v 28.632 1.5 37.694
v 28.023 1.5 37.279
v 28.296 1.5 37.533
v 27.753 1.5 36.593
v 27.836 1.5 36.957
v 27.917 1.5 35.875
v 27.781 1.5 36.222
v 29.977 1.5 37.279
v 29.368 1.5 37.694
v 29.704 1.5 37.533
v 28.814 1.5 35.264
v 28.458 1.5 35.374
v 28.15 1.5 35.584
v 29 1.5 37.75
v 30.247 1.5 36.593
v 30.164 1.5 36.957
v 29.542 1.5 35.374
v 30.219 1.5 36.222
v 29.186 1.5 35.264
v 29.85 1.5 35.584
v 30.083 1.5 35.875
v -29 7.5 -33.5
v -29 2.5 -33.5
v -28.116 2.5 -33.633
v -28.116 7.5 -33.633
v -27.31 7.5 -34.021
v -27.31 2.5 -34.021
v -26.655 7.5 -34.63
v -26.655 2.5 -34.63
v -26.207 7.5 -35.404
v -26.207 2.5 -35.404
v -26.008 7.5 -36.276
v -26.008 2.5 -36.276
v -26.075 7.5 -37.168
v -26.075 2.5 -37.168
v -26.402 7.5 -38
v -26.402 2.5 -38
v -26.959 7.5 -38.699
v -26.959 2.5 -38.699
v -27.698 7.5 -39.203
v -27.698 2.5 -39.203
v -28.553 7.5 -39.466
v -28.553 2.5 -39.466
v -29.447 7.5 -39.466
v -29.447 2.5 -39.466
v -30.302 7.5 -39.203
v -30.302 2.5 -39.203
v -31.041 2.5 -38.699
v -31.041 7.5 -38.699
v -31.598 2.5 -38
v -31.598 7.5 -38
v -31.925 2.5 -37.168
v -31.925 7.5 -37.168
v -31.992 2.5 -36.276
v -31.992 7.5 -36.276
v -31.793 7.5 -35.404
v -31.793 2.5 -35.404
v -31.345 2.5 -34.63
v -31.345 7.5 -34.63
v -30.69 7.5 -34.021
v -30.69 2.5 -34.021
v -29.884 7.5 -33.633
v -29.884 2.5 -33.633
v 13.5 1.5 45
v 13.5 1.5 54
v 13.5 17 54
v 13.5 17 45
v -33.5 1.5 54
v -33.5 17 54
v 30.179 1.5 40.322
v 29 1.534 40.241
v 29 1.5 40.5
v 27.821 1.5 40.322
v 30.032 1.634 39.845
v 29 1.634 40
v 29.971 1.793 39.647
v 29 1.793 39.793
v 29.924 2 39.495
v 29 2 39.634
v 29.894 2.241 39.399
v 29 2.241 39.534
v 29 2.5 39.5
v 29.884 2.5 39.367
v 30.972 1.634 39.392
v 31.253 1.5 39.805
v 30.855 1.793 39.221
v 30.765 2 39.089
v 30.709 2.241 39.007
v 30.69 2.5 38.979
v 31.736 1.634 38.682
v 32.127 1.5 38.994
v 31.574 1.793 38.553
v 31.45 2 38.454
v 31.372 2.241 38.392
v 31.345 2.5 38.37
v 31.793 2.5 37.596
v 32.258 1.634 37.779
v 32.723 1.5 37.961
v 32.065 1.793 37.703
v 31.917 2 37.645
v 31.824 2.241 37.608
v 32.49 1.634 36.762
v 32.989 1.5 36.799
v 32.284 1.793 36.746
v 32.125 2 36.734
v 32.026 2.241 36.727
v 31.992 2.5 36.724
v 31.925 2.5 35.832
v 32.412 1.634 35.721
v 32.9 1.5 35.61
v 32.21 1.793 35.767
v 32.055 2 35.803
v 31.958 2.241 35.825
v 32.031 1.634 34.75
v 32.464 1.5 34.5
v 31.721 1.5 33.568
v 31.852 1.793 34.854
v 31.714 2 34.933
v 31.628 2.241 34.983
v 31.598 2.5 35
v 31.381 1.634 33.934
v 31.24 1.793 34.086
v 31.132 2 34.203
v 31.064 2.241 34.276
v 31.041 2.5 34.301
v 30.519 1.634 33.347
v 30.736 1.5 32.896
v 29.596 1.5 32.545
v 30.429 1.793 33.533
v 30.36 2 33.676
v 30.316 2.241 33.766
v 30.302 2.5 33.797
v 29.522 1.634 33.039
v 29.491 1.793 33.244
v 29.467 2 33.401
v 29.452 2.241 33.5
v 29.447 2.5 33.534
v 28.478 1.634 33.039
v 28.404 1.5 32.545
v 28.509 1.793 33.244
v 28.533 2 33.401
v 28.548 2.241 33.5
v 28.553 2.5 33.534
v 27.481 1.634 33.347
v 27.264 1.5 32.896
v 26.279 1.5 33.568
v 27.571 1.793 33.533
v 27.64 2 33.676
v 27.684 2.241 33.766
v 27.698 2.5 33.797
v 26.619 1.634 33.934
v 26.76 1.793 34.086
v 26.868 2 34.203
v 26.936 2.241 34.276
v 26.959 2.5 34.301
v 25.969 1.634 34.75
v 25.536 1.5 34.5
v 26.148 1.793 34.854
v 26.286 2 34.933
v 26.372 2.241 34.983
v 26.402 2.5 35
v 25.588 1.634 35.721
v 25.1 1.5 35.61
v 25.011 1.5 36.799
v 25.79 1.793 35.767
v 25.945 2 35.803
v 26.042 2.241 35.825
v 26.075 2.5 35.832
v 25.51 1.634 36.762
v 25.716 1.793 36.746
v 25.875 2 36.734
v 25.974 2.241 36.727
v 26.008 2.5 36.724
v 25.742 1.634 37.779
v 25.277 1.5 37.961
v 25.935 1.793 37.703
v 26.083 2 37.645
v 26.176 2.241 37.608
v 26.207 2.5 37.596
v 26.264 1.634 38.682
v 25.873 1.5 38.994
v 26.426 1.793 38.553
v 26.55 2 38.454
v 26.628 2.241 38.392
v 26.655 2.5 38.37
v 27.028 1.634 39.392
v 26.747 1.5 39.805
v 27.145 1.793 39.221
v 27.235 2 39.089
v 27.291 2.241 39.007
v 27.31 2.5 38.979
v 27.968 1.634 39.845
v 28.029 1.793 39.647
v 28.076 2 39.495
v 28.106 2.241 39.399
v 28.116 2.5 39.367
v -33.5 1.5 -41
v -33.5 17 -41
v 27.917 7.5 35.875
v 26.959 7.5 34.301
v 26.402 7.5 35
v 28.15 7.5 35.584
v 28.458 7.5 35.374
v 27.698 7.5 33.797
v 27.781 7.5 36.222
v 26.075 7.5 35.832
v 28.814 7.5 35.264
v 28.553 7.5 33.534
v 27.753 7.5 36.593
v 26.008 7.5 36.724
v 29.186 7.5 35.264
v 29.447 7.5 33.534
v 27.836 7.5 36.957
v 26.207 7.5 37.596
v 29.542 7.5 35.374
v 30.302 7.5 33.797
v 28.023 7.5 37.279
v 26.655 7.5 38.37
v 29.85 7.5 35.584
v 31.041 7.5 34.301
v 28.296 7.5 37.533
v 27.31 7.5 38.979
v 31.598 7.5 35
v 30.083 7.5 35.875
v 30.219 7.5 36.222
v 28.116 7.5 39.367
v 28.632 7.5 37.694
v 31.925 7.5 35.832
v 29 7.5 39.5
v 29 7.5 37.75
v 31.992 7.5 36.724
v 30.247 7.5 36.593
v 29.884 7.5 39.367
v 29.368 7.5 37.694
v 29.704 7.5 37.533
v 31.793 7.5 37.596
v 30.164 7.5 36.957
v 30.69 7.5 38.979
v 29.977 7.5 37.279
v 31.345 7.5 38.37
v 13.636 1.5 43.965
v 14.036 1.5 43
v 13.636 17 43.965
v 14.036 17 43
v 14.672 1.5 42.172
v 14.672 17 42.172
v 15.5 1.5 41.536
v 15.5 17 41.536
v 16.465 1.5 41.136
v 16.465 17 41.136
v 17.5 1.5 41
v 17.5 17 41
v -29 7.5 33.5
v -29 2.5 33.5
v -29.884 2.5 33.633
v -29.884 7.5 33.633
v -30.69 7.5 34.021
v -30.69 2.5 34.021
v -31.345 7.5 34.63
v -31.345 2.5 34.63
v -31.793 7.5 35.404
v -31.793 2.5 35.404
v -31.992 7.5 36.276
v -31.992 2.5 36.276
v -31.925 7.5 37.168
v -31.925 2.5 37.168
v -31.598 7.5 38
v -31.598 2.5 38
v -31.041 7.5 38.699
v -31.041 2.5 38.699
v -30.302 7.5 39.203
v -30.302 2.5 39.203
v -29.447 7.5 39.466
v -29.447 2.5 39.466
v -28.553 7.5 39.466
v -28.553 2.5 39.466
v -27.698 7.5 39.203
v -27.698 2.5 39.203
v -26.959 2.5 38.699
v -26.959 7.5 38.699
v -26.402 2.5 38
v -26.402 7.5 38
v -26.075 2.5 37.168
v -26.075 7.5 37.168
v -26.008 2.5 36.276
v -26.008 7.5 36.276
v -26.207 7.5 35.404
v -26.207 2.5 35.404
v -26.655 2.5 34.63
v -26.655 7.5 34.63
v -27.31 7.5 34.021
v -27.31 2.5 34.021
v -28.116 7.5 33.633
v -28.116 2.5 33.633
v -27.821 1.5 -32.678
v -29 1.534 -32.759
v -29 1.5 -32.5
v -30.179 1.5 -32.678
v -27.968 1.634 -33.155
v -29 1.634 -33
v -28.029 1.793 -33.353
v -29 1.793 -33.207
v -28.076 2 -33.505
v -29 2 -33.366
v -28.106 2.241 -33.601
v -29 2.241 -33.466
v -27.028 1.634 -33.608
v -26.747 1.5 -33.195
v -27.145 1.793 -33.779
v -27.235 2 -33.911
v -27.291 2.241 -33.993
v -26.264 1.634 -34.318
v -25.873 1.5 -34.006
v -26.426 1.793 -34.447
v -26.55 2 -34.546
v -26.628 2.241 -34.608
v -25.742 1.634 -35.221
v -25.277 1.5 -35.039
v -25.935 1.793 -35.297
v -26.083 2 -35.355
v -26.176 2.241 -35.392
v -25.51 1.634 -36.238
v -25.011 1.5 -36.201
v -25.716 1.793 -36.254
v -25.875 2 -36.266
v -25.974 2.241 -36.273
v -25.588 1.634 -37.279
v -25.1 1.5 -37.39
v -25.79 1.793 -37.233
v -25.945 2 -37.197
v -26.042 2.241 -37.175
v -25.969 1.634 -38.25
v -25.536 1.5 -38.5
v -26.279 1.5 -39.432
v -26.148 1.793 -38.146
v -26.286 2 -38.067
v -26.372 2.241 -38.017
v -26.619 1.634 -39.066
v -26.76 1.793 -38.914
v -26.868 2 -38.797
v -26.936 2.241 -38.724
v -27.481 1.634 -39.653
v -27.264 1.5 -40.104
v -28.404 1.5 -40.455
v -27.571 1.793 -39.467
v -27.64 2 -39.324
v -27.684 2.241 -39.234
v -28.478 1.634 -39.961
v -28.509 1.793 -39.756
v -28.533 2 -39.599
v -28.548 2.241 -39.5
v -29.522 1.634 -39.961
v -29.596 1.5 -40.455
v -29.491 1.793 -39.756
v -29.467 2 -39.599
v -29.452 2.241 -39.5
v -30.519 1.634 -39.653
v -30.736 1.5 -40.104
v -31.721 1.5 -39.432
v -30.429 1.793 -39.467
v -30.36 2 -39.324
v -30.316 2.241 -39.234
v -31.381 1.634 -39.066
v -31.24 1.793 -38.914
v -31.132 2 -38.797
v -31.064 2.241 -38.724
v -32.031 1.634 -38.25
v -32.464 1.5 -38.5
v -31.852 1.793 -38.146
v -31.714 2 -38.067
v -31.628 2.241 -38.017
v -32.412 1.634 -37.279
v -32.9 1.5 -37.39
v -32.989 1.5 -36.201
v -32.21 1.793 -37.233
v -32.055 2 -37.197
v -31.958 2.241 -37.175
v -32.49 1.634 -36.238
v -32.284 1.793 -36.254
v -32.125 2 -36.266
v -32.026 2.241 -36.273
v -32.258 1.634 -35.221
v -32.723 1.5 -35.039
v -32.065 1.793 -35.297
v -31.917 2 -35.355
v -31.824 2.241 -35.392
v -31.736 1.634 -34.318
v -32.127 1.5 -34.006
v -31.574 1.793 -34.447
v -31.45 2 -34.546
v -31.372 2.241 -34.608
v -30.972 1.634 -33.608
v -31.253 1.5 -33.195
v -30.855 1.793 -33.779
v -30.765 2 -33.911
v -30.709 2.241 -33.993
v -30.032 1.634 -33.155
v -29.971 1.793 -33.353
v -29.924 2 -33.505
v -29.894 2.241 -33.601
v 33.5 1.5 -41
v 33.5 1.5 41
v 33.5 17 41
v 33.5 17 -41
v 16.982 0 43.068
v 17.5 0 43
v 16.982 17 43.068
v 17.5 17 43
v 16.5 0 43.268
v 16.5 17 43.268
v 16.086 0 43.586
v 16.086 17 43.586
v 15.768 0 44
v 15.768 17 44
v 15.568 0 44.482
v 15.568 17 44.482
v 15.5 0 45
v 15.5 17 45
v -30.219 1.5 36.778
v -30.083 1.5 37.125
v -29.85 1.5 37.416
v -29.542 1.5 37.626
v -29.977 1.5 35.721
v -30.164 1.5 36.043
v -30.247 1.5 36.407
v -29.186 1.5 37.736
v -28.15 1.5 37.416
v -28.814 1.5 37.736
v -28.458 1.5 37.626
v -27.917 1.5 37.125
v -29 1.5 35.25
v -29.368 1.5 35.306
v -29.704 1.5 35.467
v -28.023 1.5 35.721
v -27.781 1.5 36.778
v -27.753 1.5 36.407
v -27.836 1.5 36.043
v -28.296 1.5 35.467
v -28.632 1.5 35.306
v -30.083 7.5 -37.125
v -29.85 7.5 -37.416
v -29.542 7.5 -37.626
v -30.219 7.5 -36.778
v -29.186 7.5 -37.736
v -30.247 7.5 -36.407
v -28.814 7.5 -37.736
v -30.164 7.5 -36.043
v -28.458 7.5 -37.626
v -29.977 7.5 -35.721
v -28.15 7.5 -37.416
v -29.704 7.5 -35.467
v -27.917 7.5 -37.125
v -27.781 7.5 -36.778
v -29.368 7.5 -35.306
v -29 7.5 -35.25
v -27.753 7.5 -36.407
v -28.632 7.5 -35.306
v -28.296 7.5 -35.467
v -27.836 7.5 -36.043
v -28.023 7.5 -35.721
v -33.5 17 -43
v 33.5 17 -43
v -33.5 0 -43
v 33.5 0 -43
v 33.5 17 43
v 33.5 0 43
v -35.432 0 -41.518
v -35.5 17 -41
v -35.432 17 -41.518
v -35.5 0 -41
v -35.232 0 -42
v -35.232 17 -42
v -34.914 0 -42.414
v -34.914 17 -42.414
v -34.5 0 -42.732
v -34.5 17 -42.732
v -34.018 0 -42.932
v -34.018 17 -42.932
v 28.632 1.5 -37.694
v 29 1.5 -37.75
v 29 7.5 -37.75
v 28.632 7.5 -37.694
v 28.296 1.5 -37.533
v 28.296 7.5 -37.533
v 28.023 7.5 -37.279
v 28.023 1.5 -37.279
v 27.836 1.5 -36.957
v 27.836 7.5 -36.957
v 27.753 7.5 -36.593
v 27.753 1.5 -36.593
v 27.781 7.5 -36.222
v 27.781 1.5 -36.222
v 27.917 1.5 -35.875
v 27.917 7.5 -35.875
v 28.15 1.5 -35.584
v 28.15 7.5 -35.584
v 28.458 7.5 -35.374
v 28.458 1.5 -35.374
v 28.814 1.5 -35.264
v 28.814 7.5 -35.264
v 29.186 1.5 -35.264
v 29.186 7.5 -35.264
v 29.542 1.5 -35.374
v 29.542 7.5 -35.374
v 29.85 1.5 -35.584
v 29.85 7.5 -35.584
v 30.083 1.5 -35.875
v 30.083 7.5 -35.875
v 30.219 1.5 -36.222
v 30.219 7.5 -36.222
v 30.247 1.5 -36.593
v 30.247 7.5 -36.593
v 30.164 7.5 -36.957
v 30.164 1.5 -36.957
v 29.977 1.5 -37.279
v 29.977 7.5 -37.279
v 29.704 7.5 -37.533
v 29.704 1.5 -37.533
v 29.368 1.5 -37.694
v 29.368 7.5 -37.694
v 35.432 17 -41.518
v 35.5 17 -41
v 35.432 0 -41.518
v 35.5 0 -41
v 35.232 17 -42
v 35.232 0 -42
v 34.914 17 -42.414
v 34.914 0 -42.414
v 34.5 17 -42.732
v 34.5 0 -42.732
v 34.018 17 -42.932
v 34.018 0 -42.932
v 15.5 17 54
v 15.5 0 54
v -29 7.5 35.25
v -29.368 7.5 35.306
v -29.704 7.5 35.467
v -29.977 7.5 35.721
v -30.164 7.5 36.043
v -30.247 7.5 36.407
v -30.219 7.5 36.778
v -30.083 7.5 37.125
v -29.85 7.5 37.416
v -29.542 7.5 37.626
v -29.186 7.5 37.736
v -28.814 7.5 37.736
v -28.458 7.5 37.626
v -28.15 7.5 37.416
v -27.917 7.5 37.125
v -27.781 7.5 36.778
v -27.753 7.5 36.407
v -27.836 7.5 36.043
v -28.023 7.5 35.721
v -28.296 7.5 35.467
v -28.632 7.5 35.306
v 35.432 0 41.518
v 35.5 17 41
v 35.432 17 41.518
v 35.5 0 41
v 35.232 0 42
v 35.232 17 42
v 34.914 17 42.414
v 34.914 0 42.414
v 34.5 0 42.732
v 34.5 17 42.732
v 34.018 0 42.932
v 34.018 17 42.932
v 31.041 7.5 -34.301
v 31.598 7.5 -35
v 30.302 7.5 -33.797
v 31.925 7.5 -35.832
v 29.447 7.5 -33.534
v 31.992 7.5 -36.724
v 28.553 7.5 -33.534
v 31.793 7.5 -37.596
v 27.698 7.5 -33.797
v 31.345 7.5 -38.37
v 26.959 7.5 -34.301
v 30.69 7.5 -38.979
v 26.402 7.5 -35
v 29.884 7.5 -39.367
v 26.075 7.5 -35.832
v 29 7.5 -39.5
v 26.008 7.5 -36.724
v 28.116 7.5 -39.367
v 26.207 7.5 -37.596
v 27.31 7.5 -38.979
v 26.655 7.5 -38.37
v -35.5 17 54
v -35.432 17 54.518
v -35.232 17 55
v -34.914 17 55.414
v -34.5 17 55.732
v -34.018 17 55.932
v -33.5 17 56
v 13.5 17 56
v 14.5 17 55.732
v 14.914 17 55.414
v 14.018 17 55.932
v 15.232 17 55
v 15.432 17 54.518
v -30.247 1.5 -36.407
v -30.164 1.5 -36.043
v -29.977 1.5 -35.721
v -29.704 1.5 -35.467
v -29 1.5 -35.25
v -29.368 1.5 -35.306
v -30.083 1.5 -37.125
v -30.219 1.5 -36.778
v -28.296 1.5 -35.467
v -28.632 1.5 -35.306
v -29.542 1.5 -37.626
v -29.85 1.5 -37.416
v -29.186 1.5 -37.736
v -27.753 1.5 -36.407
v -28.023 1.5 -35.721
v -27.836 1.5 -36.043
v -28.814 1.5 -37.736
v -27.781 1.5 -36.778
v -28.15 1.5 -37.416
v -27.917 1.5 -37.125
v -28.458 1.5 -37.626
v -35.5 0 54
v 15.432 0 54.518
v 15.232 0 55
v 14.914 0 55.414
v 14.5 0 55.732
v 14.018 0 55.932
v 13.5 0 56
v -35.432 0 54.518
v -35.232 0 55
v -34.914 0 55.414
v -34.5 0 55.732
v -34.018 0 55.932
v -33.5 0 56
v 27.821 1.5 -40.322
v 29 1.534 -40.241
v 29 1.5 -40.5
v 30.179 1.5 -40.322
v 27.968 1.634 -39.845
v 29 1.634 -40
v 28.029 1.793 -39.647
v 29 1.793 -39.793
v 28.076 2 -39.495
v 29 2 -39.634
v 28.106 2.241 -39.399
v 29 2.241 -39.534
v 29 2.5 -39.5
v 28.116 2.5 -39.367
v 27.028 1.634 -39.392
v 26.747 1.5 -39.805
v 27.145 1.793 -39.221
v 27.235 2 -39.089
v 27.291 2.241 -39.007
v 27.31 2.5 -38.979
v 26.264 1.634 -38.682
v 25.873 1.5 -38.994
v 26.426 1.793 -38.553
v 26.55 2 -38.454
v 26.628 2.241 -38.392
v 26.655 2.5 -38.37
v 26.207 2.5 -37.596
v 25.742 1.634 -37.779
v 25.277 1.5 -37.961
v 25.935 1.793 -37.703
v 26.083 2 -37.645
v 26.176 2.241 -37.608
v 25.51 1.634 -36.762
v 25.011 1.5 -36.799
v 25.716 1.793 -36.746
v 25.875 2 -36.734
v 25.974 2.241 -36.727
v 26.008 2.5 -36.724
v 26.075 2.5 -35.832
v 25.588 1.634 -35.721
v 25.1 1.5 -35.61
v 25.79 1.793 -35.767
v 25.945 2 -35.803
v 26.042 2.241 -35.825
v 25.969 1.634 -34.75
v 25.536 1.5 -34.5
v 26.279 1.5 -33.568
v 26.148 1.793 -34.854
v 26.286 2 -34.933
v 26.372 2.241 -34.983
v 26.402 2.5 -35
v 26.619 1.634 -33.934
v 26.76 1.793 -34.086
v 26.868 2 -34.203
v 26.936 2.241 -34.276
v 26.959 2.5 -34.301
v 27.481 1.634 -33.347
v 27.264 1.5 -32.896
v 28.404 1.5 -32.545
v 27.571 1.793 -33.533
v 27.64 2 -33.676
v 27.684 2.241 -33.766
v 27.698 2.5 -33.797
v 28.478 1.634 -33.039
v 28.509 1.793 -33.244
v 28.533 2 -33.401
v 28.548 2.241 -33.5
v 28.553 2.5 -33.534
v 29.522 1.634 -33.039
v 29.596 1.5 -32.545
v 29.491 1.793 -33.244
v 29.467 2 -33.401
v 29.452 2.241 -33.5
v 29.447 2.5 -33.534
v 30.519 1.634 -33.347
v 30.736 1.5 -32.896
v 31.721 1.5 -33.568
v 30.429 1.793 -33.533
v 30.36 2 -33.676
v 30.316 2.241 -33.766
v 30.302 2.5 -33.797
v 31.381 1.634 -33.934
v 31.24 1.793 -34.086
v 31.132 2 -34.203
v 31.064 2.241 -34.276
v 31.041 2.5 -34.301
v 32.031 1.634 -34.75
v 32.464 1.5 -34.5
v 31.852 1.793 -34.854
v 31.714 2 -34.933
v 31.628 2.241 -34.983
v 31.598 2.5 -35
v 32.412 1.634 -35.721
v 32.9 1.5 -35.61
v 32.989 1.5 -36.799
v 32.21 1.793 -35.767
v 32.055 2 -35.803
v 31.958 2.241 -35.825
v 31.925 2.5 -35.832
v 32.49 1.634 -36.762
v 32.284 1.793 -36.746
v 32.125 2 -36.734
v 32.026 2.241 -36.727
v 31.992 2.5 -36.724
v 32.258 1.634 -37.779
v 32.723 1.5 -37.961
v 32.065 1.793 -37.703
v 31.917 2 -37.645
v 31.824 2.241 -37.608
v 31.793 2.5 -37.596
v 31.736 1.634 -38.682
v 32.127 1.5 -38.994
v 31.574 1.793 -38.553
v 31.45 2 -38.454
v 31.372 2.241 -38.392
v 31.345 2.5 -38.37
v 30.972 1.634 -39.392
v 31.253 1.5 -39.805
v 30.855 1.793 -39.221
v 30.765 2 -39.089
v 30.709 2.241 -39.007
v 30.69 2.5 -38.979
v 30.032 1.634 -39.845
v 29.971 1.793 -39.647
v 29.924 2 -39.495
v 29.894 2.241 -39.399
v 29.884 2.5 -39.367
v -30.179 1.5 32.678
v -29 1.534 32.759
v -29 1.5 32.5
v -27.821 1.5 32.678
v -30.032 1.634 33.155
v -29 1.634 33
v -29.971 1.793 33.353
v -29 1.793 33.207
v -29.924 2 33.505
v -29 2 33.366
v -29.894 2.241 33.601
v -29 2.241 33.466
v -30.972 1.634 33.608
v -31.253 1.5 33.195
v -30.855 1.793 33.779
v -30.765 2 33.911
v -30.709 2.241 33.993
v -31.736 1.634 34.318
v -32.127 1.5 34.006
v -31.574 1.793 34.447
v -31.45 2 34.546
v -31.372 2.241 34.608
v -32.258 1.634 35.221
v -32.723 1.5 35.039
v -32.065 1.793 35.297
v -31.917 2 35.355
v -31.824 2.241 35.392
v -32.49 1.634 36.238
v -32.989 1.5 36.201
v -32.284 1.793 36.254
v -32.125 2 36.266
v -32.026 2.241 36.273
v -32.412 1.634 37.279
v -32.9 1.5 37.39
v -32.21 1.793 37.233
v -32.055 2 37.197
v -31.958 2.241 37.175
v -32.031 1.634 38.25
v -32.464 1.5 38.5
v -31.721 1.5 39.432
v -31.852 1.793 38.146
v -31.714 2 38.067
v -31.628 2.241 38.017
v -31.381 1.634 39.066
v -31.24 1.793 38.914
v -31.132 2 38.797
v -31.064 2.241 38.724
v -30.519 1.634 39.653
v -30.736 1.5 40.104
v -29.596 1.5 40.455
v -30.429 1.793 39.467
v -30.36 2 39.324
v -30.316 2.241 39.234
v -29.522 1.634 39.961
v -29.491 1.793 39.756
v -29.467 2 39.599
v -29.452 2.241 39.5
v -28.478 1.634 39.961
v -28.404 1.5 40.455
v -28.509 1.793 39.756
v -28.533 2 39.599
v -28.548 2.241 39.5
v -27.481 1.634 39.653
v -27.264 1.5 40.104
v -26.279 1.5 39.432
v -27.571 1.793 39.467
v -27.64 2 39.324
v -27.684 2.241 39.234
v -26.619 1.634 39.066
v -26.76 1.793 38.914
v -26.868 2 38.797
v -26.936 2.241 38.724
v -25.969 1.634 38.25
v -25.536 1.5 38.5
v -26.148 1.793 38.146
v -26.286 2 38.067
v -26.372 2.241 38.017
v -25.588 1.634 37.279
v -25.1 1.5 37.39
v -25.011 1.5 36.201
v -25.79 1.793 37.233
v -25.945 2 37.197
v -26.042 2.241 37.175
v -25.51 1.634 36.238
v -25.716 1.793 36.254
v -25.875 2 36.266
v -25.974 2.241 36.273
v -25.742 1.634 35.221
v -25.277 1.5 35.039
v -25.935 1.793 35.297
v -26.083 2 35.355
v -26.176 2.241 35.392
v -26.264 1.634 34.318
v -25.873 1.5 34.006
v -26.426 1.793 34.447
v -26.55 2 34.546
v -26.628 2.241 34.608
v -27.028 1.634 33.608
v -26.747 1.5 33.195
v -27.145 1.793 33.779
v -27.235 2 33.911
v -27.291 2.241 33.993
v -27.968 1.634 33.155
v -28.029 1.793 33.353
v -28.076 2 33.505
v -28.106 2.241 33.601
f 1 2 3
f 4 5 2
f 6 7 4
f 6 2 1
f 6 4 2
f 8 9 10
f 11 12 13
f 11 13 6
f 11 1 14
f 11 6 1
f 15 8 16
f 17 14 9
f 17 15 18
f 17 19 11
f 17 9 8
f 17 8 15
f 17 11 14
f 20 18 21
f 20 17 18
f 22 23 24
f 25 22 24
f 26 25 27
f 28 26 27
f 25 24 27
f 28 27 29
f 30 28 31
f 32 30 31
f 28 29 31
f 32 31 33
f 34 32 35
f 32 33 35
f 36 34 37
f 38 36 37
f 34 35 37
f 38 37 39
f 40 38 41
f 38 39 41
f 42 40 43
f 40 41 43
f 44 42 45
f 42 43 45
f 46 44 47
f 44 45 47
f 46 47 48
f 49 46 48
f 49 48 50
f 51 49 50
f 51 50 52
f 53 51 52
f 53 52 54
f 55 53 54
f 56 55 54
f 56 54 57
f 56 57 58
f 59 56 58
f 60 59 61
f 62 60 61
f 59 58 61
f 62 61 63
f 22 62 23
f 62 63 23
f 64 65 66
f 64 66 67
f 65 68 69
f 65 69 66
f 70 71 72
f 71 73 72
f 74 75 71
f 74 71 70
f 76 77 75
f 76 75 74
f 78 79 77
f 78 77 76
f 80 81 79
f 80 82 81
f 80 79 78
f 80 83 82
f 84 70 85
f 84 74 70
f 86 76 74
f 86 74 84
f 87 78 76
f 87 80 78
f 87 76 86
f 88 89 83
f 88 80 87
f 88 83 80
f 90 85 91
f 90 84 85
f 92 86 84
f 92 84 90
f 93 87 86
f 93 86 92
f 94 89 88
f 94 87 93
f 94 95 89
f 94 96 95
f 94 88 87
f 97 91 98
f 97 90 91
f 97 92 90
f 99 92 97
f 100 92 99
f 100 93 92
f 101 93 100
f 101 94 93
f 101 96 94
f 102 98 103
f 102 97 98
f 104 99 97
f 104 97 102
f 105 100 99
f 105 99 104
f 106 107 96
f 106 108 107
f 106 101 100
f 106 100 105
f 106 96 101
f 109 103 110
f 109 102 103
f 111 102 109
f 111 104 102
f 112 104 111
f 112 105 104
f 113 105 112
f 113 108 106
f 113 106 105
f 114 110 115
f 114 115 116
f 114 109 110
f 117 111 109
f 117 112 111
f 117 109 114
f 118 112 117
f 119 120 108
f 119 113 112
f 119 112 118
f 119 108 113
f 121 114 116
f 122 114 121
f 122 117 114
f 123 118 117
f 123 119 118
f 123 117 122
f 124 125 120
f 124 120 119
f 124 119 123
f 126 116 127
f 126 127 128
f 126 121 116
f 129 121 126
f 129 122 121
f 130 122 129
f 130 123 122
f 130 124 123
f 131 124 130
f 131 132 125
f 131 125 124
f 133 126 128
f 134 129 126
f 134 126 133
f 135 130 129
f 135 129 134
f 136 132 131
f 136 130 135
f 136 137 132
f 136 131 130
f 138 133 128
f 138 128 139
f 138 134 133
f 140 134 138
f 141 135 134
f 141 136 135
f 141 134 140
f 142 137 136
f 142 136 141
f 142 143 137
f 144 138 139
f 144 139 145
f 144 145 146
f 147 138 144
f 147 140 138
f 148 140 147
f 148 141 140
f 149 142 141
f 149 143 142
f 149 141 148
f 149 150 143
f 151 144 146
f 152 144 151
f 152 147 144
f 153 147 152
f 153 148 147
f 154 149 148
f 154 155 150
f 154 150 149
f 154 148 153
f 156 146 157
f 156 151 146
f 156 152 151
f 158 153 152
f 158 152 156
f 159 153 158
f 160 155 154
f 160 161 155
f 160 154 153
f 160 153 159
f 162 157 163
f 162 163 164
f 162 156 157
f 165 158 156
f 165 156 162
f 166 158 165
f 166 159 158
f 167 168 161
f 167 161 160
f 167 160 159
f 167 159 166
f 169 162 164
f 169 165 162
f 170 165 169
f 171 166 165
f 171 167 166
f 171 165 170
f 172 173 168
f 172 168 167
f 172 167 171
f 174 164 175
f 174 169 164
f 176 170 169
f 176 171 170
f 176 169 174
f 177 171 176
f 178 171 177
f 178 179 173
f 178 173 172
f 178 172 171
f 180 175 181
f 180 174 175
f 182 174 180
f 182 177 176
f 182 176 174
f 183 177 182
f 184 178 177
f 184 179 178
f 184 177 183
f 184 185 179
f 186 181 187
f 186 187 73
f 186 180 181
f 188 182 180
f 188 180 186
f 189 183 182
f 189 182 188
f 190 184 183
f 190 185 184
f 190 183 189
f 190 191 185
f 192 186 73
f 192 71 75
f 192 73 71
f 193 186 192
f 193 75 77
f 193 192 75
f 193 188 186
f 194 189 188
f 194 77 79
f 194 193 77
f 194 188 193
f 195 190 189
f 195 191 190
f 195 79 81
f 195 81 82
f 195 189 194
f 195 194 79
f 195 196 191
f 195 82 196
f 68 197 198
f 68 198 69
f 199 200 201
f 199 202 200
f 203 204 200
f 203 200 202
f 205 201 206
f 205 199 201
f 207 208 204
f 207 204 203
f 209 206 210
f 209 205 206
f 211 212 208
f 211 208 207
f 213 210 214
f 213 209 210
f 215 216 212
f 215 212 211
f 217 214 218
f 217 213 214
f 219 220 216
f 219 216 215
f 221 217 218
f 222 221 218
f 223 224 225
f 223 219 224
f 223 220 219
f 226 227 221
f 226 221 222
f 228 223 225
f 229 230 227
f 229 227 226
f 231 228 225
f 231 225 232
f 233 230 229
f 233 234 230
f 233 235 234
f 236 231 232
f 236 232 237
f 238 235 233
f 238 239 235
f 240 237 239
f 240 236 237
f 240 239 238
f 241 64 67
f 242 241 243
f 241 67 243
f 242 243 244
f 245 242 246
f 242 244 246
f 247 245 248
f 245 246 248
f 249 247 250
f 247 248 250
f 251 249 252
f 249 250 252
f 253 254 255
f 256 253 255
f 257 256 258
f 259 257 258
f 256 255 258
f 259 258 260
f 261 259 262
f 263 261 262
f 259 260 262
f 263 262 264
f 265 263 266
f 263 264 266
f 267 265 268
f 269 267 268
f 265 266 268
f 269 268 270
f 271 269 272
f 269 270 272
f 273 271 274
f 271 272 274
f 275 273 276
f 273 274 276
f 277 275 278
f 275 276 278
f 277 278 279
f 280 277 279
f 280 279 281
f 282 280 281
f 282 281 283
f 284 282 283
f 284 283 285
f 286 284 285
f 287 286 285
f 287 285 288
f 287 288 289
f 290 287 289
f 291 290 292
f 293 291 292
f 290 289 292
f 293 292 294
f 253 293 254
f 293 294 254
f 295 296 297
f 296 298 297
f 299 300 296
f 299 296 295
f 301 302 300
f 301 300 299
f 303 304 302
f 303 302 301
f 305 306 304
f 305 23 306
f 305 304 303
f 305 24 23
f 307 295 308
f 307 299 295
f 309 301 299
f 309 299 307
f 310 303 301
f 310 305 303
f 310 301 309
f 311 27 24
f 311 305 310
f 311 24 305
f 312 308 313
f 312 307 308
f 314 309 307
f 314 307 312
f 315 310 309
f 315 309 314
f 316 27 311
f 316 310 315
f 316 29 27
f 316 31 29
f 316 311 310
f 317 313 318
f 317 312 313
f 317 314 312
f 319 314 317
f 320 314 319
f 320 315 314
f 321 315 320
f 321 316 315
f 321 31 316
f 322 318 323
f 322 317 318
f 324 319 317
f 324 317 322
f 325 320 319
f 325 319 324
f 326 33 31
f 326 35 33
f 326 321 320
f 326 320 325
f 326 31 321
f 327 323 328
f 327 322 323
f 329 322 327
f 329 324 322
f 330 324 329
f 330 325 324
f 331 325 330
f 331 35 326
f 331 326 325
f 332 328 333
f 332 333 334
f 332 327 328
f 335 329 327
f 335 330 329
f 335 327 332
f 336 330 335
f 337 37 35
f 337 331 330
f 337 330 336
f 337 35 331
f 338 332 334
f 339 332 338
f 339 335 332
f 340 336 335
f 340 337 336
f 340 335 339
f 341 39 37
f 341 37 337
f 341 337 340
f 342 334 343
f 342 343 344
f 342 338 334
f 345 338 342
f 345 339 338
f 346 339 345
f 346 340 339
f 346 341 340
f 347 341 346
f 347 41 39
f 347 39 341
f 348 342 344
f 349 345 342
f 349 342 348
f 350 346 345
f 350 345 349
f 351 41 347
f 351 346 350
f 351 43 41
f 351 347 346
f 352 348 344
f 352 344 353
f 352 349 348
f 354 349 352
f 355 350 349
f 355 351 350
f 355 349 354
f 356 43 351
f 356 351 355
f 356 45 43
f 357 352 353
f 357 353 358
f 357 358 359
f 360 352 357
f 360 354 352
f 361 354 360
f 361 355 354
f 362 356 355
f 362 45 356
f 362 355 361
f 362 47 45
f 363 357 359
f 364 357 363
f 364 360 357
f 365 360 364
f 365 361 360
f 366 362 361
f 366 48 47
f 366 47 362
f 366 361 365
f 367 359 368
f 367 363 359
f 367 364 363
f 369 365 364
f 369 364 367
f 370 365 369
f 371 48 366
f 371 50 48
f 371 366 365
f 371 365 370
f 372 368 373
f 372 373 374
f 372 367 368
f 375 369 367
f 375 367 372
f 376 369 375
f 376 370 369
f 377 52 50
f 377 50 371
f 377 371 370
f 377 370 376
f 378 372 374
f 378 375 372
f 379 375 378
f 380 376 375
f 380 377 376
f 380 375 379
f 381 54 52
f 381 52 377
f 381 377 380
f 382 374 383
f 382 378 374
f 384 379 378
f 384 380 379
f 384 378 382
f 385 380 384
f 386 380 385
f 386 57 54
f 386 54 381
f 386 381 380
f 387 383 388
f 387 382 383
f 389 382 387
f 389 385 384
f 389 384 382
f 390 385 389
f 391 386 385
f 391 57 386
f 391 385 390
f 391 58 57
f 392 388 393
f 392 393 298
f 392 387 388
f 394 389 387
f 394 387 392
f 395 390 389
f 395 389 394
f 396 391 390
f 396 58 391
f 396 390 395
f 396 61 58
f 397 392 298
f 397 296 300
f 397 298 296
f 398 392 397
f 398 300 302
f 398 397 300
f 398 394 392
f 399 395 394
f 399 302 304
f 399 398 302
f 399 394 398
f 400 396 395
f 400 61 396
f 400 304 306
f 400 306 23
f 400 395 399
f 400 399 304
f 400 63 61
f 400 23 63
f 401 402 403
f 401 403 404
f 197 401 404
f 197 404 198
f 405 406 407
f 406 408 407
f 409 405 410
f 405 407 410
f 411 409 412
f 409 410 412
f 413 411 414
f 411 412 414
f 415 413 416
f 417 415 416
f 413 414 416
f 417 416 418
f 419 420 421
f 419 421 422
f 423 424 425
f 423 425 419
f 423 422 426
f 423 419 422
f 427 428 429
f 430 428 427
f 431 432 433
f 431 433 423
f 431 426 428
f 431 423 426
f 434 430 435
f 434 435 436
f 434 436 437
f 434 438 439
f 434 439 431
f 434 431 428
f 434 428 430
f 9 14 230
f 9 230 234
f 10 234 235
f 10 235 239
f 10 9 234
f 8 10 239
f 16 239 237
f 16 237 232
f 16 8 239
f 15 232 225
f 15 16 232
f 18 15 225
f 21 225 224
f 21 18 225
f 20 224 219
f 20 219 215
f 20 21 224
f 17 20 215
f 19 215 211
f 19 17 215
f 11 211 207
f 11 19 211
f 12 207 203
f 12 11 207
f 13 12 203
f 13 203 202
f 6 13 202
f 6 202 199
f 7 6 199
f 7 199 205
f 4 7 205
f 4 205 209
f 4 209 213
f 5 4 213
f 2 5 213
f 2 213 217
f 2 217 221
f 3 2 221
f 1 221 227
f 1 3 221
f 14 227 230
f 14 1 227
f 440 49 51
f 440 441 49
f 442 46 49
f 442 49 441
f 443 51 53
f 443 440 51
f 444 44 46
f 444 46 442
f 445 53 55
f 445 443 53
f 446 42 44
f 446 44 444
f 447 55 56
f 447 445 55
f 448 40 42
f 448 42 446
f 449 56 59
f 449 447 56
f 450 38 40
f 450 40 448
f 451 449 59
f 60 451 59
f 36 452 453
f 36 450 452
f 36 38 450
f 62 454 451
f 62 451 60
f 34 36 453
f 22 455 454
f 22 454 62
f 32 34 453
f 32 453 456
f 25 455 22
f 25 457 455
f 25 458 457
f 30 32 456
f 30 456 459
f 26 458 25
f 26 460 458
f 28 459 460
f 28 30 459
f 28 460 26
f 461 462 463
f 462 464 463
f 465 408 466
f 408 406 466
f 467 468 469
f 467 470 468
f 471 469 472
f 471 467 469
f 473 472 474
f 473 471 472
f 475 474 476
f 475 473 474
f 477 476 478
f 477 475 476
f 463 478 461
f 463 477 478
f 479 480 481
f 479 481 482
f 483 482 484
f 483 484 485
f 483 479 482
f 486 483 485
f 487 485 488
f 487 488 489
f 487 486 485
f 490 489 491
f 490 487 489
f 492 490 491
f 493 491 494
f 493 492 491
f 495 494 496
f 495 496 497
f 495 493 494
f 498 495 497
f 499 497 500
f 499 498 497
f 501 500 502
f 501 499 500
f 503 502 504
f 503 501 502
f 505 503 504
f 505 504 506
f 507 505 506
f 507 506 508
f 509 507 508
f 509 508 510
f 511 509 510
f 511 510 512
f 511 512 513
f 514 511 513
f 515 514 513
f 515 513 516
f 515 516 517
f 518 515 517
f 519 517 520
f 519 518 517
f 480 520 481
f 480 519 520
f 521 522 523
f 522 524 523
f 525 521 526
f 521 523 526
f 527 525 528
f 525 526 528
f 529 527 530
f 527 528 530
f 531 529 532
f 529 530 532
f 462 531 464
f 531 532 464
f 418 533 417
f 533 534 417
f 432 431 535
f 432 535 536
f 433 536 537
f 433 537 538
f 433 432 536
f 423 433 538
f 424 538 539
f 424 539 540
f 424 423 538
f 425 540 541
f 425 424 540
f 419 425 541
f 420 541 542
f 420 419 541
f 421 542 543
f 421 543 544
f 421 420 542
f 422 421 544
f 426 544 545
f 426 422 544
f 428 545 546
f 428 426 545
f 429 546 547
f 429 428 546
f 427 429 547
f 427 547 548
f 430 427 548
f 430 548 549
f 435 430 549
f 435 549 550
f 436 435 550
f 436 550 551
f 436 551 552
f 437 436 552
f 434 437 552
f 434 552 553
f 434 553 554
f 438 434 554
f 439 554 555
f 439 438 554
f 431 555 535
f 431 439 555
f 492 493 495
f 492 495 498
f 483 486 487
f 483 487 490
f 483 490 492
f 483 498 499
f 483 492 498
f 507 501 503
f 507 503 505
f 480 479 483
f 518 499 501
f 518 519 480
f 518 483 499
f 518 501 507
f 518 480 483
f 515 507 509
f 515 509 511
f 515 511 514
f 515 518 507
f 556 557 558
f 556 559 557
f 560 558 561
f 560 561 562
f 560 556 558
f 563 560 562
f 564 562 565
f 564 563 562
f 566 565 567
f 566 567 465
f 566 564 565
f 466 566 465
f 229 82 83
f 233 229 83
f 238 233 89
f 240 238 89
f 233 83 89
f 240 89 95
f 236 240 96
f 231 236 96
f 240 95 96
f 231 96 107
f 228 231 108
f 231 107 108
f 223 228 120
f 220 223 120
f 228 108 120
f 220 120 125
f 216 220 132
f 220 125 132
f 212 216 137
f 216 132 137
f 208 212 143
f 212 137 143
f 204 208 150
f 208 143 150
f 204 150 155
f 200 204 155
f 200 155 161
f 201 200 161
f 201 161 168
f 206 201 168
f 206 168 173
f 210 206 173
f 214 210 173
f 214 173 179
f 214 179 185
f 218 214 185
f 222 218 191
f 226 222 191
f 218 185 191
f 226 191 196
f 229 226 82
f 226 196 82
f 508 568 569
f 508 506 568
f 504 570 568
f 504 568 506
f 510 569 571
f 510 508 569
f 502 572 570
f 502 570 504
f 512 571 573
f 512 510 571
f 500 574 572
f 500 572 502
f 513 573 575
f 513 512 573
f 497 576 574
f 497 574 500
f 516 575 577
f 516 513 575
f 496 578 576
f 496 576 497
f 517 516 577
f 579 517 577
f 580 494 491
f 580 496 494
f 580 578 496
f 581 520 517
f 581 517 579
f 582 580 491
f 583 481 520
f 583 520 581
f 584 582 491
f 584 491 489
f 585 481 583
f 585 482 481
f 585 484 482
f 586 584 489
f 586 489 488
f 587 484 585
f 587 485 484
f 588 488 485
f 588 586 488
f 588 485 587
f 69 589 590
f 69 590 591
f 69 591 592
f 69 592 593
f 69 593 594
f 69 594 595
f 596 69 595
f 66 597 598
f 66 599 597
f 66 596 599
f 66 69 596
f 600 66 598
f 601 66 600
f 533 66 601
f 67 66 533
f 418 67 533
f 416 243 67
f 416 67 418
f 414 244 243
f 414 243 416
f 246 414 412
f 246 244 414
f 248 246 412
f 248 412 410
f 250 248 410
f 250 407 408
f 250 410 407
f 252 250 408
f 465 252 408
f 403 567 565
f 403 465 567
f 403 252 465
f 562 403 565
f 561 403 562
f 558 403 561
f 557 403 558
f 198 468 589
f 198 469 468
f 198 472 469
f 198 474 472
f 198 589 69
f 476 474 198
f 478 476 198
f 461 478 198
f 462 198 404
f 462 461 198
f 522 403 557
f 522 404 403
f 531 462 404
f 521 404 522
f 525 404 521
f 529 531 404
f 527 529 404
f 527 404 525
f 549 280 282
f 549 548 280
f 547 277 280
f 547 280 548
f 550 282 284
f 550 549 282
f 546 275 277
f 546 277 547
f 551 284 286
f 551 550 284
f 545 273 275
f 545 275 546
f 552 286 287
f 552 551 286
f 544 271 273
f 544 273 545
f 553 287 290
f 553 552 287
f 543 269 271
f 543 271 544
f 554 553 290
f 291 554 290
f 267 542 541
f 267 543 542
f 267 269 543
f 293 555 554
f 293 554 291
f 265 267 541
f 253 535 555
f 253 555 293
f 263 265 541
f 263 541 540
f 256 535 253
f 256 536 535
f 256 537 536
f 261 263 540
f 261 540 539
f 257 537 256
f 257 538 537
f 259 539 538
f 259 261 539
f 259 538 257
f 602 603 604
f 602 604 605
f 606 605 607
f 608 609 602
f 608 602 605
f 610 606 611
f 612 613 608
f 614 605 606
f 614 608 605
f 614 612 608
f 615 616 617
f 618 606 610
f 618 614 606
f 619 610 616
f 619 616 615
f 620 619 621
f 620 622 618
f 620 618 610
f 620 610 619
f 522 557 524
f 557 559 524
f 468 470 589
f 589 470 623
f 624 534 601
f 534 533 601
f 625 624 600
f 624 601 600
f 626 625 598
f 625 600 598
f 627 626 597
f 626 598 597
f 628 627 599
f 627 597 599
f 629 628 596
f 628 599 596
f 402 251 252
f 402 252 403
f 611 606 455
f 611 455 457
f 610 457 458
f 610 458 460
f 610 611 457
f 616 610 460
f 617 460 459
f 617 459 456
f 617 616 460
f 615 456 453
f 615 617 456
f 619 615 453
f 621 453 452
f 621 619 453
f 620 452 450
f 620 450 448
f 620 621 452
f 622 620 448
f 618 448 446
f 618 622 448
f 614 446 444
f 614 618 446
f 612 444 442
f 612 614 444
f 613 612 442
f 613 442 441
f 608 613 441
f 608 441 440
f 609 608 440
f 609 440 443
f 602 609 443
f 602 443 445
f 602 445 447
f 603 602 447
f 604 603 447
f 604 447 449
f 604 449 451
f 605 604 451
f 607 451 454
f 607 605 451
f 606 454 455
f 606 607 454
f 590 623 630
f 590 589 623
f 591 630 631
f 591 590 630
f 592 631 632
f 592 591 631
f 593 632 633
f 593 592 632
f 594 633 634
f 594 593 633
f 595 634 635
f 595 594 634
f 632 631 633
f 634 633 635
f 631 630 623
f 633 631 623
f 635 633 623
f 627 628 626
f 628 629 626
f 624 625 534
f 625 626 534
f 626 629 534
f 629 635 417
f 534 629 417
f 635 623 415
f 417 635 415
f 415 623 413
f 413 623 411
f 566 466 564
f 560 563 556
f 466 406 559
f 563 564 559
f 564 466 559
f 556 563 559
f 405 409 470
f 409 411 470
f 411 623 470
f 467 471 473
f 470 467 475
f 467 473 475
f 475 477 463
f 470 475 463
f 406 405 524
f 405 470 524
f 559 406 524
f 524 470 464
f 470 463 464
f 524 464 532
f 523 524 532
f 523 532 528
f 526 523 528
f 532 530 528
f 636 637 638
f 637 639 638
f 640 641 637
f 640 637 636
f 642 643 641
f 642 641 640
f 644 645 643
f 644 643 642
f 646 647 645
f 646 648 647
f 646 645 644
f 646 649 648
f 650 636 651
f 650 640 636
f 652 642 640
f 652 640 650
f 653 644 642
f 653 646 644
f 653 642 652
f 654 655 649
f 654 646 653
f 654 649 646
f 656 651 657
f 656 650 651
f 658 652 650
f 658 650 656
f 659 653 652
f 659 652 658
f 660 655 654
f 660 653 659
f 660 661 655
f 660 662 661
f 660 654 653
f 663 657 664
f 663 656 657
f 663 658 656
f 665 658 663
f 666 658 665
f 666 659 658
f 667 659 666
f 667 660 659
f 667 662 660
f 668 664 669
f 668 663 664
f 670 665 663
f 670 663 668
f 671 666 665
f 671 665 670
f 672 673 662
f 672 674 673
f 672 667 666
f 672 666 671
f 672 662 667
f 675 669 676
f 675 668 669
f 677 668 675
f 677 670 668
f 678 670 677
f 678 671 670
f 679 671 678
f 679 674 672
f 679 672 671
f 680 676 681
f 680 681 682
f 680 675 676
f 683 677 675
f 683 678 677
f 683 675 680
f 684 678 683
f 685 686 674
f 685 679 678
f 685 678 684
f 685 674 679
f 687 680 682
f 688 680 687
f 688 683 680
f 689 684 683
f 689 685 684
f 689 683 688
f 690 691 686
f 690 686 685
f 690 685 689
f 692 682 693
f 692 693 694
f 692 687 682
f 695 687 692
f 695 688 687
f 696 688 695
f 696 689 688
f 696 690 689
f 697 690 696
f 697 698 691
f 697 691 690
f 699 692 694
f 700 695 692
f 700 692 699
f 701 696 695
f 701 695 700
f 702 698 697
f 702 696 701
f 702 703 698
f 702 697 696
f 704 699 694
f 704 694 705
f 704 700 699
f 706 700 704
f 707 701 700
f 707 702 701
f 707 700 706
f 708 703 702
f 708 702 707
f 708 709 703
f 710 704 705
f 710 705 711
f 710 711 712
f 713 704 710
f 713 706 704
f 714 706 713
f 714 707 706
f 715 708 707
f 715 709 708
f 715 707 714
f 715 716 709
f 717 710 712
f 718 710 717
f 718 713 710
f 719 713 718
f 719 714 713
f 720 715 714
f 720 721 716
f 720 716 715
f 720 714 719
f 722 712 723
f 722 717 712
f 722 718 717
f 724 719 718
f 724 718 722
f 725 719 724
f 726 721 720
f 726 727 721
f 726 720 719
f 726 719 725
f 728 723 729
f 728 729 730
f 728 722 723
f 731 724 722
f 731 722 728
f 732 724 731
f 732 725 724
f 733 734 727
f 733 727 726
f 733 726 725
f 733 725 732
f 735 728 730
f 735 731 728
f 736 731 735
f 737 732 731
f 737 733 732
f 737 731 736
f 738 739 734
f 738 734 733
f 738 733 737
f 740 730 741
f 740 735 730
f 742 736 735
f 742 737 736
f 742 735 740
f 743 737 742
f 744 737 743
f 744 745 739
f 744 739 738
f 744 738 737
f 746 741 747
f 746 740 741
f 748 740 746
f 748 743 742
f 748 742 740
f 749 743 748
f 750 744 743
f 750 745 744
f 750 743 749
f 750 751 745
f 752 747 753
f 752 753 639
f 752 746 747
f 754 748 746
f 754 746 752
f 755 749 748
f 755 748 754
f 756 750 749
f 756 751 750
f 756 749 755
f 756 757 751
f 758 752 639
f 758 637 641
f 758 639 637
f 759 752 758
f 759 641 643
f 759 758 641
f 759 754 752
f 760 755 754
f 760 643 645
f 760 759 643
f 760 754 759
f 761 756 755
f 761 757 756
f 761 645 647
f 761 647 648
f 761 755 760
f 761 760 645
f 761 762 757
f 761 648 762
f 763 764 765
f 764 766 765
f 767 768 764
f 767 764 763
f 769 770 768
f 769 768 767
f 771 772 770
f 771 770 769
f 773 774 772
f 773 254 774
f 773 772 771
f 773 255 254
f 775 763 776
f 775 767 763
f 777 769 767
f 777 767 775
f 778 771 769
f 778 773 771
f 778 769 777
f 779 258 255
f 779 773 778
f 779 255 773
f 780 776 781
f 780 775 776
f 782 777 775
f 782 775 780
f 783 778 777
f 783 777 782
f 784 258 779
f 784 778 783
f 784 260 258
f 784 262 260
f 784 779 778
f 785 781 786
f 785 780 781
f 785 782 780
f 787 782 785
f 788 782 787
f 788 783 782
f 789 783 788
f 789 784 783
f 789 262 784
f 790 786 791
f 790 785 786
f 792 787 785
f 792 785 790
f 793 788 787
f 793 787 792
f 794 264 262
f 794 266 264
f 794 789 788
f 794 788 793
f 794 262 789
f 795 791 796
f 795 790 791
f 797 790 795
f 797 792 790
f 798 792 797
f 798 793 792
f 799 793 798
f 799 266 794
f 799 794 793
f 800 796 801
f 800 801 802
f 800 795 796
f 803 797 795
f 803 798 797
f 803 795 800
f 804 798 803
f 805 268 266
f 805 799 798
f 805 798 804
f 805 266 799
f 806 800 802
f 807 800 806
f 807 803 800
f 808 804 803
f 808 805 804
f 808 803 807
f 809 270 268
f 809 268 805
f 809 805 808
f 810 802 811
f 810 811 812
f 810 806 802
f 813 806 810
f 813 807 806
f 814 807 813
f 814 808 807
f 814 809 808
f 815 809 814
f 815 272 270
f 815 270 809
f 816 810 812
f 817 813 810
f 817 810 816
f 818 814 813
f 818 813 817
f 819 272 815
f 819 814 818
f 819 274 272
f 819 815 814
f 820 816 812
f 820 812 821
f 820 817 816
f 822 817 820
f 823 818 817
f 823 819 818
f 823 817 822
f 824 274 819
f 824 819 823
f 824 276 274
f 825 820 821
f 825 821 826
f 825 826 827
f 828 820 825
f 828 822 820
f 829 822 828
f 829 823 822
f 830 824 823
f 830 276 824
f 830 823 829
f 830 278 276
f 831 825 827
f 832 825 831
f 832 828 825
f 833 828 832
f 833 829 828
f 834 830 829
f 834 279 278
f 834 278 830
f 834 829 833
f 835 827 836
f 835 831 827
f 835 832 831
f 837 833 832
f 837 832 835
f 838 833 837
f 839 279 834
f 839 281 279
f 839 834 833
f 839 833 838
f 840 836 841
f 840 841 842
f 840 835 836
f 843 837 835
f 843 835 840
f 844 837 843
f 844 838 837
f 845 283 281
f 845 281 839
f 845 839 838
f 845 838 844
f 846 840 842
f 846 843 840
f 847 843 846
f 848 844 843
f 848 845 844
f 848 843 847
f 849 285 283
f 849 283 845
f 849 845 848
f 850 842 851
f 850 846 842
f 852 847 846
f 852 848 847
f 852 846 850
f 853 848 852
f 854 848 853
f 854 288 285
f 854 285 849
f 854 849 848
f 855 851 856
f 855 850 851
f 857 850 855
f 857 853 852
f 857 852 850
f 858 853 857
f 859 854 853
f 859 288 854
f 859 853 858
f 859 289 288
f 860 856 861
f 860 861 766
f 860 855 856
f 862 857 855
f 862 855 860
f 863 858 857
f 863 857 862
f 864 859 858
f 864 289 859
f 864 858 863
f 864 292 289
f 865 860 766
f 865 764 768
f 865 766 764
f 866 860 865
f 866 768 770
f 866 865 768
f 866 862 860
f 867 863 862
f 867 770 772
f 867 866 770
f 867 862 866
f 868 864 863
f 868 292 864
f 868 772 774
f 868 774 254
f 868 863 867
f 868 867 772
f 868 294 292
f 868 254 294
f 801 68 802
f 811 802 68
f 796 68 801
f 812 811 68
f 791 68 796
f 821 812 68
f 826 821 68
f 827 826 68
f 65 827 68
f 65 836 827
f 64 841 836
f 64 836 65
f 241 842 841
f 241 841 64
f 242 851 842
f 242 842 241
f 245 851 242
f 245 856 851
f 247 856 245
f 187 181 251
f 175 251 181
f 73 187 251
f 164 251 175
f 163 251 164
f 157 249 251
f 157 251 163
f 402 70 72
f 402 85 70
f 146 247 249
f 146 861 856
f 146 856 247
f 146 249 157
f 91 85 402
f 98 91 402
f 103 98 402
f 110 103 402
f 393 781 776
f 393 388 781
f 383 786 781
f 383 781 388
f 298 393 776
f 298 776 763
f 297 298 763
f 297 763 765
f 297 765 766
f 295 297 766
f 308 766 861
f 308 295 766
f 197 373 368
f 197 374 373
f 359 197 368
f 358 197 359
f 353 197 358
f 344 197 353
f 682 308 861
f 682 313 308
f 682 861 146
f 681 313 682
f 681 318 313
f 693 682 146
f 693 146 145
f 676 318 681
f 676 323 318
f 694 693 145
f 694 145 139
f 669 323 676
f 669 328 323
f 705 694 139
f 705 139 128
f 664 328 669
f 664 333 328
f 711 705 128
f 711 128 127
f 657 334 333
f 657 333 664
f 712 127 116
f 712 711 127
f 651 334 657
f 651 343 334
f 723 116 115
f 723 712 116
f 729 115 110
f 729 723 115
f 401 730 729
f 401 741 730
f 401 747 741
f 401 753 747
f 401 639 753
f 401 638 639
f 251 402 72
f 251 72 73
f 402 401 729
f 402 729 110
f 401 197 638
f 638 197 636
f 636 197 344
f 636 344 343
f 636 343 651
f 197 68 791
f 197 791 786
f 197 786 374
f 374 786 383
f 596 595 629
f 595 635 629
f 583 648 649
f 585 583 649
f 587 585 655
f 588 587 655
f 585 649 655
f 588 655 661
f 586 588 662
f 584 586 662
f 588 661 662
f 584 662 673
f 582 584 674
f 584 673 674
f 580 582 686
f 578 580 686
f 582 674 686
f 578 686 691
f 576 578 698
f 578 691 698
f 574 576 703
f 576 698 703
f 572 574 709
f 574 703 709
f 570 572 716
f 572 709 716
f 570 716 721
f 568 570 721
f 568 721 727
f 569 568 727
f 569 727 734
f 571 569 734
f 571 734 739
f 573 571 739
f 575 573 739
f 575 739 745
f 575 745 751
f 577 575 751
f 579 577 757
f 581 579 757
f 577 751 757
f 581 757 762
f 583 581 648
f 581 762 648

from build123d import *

# Parameters (mm, degrees)
BOSS_EXTRUDE1_DEPTH = 1.5
SKETCH3_R           = 3
SKETCH3_R_2         = 1.25
BOSS_EXTRUDE3_DEPTH = 6
FILLET2_R           = 1
BOSS_EXTRUDE5_DEPTH = 15.5
FILLET6_R           = 2
FILLET7_R           = 4


with BuildPart() as part:
    # Sketch1 → Boss-Extrude1 (new body)
    with BuildSketch(Plane(origin=(0, 0, 0), x_dir=(1, 0, 0), z_dir=(0, 1, 0))):
        Polygon((35.5, 43), (-35.5, 43), (-35.5, -56), (15.5, -56), (15.5, -43), (35.5, -43), align=None)
    extrude(amount=BOSS_EXTRUDE1_DEPTH)

    # Sketch3 → Boss-Extrude3 (add)
    # profile 1 of 4: a face of its own
    with BuildSketch(Plane(origin=(0, 1.5, 0), x_dir=(1, 0, 0), z_dir=(0, 1, 0))):
        with Locations(Location((-29, 36.5, 0), (0, 0, 270))):
            Circle(SKETCH3_R)
        with Locations(Location((-29, 36.5, 0), (0, 0, 270))):
            Circle(SKETCH3_R_2, mode=Mode.SUBTRACT)
    # profile 2 of 4: a face of its own
    with BuildSketch(Plane(origin=(0, 1.5, 0), x_dir=(1, 0, 0), z_dir=(0, 1, 0))):
        with Locations(Location((29, 36.5, 0), (0, 0, 90))):
            Circle(SKETCH3_R)
        with Locations(Location((29, 36.5, 0), (0, 0, 90))):
            Circle(SKETCH3_R_2, mode=Mode.SUBTRACT)
    # profile 3 of 4: a face of its own
    with BuildSketch(Plane(origin=(0, 1.5, 0), x_dir=(1, 0, 0), z_dir=(0, 1, 0))):
        with Locations(Location((29, -36.5, 0), (0, 0, 270))):
            Circle(SKETCH3_R)
        with Locations(Location((29, -36.5, 0), (0, 0, 270))):
            Circle(SKETCH3_R_2, mode=Mode.SUBTRACT)
    # profile 4 of 4: a face of its own
    with BuildSketch(Plane(origin=(0, 1.5, 0), x_dir=(1, 0, 0), z_dir=(0, 1, 0))):
        with Locations(Location((-29, -36.5, 0), (0, 0, 90))):
            Circle(SKETCH3_R)
        with Locations(Location((-29, -36.5, 0), (0, 0, 90))):
            Circle(SKETCH3_R_2, mode=Mode.SUBTRACT)
    extrude(amount=BOSS_EXTRUDE3_DEPTH)

    # Fillet2
    fillet2_edges = [part.edges().sort_by_distance(p)[0] for p in [
        (-29, 1.5, -39.5),
        (29, 1.5, -33.5),
        (29, 1.5, 33.5),
        (-29, 1.5, 39.5),
    ]]
    fillet(fillet2_edges, radius=FILLET2_R)

    # Sketch5 → Boss-Extrude5 (add)
    with BuildSketch(Plane(origin=(0, 1.5, 0), x_dir=(1, 0, 0), z_dir=(0, 1, 0))):
        Polygon((-35.5, 43), (-35.5, -56), (15.5, -56), (15.5, -43), (35.5, -43), (35.5, 43), align=None)
        Polygon((-33.5, 41), (-33.5, -54), (13.5, -54), (13.5, -41), (33.5, -41), (33.5, 41), align=None, mode=Mode.SUBTRACT)
    extrude(amount=BOSS_EXTRUDE5_DEPTH)

    # Fillet6
    fillet6_edges = [part.edges().sort_by_distance(p)[0] for p in [
        (-35.5, 8.5, -43),
        (35.5, 8.5, -43),
        (35.5, 8.5, 43),
        (15.5, 8.5, 43),
        (15.5, 8.5, 56),
        (-35.5, 8.5, 56),
    ]]
    fillet(fillet6_edges, radius=FILLET6_R)

    # Fillet7
    fillet7_edges = [part.edges().sort_by_distance(p)[0] for p in [
        (13.5, 9.25, 41),
    ]]
    fillet(fillet7_edges, radius=FILLET7_R)


solid = part.part
